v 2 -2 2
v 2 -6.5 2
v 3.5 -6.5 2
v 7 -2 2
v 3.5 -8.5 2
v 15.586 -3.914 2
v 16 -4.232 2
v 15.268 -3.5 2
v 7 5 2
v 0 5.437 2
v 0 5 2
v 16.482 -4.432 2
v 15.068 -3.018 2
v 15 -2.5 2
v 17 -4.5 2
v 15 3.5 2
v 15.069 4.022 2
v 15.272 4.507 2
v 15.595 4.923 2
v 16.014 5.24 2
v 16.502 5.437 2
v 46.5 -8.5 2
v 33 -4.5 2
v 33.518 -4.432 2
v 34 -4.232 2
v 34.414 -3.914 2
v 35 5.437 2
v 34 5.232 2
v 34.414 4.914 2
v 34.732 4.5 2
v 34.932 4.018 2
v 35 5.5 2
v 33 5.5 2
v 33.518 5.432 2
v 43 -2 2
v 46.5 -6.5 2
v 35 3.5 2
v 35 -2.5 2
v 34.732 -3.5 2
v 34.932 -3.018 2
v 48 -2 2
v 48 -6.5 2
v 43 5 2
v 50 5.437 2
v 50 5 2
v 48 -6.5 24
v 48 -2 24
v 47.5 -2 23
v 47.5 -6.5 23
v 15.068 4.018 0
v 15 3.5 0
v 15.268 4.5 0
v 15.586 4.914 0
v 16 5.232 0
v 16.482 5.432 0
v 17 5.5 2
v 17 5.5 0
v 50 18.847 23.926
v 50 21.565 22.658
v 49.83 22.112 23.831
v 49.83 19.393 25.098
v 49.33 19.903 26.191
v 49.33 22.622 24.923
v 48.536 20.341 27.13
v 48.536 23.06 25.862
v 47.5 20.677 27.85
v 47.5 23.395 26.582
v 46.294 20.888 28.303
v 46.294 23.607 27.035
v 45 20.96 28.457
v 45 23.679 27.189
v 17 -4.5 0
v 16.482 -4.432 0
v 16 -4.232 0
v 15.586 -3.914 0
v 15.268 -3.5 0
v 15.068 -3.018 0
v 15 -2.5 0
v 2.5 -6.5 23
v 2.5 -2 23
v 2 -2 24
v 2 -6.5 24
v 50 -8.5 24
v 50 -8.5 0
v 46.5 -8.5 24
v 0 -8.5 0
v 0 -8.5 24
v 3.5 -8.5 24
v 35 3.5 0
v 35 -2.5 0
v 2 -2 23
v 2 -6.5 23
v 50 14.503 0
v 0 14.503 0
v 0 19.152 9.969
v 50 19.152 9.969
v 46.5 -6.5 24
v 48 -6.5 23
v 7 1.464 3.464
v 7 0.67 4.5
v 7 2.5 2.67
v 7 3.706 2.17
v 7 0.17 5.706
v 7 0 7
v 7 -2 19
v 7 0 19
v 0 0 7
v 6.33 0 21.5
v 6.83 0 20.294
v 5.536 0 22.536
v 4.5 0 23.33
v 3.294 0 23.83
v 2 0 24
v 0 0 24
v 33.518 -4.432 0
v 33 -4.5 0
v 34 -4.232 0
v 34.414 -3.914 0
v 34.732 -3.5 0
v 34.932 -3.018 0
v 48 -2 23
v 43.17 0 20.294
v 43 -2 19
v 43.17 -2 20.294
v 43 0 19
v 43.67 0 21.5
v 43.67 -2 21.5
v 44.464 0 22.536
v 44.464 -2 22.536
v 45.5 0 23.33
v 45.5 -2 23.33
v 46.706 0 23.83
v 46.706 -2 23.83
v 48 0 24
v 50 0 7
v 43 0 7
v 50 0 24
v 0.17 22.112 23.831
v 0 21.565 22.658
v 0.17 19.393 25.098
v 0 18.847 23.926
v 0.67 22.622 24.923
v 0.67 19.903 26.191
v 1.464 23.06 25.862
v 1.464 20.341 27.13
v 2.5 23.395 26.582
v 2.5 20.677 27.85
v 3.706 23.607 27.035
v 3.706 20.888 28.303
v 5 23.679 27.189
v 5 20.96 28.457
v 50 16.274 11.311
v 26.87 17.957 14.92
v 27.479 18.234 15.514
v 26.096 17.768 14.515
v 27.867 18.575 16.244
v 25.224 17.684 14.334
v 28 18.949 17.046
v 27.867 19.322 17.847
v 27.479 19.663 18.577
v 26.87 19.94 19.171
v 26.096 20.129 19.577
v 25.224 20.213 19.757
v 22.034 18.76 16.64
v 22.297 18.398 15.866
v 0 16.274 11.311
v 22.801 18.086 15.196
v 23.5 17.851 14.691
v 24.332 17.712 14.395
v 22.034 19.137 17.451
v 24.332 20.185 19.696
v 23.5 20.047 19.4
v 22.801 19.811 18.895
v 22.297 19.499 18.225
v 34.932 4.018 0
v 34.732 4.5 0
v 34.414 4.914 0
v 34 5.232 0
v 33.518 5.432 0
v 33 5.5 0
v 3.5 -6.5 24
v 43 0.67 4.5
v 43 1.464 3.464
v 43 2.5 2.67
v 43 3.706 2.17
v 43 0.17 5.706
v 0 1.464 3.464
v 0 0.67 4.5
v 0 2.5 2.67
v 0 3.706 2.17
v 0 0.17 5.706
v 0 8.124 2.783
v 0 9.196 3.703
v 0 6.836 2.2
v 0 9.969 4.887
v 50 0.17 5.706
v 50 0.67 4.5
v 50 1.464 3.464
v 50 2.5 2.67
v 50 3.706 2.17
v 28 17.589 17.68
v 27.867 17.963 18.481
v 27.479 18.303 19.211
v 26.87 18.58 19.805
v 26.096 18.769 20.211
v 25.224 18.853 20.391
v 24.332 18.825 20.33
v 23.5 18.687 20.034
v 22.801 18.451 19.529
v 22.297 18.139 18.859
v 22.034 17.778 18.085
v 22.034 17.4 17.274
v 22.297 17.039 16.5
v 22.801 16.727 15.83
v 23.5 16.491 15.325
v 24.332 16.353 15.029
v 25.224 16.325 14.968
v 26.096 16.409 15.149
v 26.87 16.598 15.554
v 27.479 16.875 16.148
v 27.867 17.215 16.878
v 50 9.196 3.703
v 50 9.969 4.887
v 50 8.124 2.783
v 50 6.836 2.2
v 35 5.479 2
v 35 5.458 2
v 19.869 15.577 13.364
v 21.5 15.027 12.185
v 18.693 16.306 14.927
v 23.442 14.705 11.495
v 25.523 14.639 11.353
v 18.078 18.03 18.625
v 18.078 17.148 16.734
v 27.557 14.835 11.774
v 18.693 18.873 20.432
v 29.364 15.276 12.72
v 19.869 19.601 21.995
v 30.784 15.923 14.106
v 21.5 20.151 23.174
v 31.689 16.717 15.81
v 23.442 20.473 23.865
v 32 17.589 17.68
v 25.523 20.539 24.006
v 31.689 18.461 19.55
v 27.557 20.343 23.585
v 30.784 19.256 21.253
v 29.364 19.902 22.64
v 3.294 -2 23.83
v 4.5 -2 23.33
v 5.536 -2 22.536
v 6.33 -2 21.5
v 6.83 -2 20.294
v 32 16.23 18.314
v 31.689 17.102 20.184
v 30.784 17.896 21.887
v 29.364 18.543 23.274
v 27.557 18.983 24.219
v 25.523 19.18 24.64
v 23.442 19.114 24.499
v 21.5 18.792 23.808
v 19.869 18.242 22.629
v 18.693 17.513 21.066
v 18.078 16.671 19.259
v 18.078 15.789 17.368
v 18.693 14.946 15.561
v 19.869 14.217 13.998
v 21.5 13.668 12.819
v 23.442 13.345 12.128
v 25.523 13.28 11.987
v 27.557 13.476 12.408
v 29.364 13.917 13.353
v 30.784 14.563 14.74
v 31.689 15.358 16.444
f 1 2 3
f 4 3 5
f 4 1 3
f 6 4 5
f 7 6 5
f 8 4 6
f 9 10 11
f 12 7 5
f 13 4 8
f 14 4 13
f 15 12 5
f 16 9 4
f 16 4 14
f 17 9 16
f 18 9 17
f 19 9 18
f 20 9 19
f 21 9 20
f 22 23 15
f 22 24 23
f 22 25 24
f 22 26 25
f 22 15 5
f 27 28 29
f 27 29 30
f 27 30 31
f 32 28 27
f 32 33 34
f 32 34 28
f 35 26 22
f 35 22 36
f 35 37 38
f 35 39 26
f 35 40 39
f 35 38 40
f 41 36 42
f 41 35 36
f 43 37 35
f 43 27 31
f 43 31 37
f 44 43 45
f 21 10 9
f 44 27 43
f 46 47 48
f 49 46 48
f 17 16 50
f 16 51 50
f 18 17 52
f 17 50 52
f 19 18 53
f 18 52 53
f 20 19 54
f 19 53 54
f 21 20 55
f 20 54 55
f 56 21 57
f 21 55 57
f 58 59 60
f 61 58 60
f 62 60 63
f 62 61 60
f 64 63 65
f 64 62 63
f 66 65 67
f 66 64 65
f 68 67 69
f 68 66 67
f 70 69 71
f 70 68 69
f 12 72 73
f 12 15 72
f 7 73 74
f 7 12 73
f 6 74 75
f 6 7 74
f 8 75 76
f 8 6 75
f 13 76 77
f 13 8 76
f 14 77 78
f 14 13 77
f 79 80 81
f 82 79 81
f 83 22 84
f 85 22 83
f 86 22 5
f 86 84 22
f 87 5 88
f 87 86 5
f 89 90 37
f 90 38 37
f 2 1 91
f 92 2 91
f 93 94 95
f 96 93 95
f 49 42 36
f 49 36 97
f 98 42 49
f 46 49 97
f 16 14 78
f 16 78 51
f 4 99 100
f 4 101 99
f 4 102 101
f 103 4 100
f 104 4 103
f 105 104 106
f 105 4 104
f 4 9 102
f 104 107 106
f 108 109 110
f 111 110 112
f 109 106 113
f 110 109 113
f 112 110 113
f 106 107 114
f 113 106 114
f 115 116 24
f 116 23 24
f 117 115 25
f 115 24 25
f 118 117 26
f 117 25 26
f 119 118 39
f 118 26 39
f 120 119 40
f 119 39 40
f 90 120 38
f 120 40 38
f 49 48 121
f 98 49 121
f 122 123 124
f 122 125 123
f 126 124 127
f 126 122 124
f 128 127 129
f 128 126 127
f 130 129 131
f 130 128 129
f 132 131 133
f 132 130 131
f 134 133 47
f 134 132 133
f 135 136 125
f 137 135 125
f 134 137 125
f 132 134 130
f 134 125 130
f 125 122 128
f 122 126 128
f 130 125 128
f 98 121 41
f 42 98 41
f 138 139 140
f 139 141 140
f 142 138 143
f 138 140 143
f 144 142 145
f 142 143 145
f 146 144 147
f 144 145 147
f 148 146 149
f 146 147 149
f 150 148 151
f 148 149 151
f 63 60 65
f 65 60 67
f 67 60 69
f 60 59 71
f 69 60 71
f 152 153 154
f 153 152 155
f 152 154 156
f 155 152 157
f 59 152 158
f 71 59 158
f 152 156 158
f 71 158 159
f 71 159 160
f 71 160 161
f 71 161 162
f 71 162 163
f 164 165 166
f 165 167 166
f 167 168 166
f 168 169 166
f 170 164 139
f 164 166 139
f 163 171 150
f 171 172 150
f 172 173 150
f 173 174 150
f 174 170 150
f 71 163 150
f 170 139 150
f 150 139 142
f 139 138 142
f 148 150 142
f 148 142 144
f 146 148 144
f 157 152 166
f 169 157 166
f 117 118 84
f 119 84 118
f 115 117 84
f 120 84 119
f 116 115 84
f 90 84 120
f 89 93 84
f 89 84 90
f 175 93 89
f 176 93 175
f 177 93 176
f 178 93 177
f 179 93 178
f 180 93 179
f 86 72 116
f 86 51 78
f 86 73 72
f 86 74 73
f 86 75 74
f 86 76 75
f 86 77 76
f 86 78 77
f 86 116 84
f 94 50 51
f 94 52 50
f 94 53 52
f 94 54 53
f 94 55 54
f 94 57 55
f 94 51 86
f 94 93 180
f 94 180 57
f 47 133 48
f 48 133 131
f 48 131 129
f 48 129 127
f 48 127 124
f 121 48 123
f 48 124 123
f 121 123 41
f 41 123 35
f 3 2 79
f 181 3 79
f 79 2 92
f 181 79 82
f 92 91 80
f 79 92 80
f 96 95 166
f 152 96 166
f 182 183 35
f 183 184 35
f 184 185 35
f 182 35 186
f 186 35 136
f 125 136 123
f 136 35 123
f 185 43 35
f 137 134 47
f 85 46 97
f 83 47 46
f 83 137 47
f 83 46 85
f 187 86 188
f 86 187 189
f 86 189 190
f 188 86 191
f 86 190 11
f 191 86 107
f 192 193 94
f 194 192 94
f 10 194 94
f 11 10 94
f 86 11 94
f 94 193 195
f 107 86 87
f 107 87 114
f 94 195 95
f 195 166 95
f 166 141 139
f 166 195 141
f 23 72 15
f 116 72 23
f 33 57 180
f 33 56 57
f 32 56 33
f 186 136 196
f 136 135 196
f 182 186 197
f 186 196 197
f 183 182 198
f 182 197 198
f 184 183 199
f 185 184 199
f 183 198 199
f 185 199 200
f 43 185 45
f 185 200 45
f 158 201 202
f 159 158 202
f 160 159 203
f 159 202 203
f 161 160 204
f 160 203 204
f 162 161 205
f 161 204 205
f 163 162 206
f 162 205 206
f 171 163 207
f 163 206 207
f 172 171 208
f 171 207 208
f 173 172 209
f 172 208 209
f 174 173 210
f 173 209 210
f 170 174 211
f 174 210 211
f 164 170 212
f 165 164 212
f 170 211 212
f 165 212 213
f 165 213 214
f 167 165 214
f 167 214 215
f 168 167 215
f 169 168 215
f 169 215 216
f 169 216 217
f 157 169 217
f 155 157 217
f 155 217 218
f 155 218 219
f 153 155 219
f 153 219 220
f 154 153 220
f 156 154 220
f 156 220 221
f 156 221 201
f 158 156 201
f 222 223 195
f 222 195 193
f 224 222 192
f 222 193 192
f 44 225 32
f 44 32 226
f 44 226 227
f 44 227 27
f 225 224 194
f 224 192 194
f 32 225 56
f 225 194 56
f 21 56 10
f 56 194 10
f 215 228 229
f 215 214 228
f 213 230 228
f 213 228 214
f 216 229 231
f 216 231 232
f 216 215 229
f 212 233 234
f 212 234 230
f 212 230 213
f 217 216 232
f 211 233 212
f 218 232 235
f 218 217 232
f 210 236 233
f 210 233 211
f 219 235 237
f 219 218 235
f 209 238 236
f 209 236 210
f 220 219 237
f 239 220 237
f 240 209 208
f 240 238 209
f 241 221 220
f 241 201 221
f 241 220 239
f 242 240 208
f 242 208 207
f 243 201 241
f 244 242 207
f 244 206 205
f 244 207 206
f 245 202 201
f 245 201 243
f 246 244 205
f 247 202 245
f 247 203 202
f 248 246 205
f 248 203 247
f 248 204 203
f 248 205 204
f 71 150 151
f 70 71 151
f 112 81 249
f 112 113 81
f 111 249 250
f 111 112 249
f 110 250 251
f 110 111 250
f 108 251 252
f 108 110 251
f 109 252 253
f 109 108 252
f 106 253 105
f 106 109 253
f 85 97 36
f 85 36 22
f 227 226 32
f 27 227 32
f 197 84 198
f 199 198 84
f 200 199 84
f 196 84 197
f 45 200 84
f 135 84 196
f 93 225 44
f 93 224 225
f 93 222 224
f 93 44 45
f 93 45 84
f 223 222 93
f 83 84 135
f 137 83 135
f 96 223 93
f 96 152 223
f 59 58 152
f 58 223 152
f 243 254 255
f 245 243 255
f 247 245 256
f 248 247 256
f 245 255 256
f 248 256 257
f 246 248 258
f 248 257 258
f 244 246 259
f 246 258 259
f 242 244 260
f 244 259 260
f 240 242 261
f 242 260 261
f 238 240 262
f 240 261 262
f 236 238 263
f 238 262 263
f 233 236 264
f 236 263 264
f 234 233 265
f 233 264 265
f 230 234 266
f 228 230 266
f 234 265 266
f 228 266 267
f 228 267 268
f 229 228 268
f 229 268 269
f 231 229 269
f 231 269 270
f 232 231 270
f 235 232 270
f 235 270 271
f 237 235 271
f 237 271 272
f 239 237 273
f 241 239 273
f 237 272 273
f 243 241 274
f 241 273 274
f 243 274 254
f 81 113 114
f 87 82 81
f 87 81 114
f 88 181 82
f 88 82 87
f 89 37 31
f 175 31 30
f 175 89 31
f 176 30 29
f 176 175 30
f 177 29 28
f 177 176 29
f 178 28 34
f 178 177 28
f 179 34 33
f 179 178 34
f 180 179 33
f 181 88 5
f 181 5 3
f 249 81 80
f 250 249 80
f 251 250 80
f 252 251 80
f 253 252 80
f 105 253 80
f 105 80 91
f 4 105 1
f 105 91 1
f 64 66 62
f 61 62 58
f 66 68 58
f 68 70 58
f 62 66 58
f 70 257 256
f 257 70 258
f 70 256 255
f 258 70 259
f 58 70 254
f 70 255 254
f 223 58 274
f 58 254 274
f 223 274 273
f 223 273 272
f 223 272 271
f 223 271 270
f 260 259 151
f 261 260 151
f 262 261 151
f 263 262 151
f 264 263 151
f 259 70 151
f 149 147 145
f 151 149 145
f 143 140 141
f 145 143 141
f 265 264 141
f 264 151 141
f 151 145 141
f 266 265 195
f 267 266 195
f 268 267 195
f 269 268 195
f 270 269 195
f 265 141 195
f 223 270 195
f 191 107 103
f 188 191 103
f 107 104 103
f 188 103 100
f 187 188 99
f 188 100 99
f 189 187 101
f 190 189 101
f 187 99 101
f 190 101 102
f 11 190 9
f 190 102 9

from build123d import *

# Parameters (mm, degrees)
F1_DEPTH      = 50
F3_DEPTH      = 3
F5_DEPTH      = 6.5
F6_W          = 2
F6_H          = 22
F5_FACE1_W    = 6.5
F5_FACE1_H    = 22
F7_DEPTH      = 1.5
F8_W          = 2
F8_H          = 22
F9_DEPTH      = 1.5
F10_W         = 36
F10_H         = 22
F11_DEPTH     = 2
F12_W         = 20
F12_H         = 10
F13_DEPTH     = 28.4580883963
F14_T4_DEPTH  = 50
F14_T10_DEPTH = 50
F14_T16_DEPTH = 50
F14_T23_DEPTH = 50
F14_T29_DEPTH = 50
F15_R         = 5
F16_T4_DEPTH  = 7.0003952761
F17_R         = 2
F18_R         = 2
F19_R         = 7
F19_R_2       = 3
F20_DEPTH     = 1.5
F22_DEPTH     = 4.5
F24_DEPTH     = 4.5
F25_R         = 5
F26_R         = 5


# Not quite as in the source:
# - a fillet or chamfer that OpenCascade refuses, or shapes differently, is made with other operations: its cross-section is extruded or revolved along the edge and cut away or added


with BuildPart() as f1:
    # F0 (on Right) → F1 (new body)
    with BuildSketch(Plane.YZ):
        Polygon((-2, 0), (0, 0), (0, 2), (0, 24), (-2, 24), align=None)
        Polygon((0, 2), (0, 0), (11, 0), (16.274498548, 11.3111986384), (23.6785478522, 27.1892336111), (20.9596244911, 28.4570883963), (8.6224815594, 2), align=None)
        Polygon((16.274498548, 11.3111986384), (11, 0), (14.5032248927, 0), (19.1520257719, 9.9693856574), align=None)
    extrude(amount=F1_DEPTH)

    # F2 (on face) → F3 (cut, through all)
    with BuildSketch(Plane(origin=(0, 6.3164084922, -2.9453896519), x_dir=(1, 0, 0), z_dir=(0, -0.906307787, 0.4226182617))):
        with BuildLine():
            ThreePointArc((22, 23.4566337426), (25, 20.4566337426), (28, 23.4566337426))
            Line((28, 23.4566337426), (22, 23.4566337426))
        make_face()
        with BuildLine():
            Line((22, 23.4566337426), (28, 23.4566337426))
            ThreePointArc((28, 23.4566337426), (25, 26.4566337426), (22, 23.4566337426))
        make_face()
    extrude(amount=-F3_DEPTH, mode=Mode.SUBTRACT)

    # F4 (on face) → F5 (join)
    with BuildSketch(Plane.XZ.offset(2)):
        Polygon((2, 2), (2, 24), (0, 24), (0, 0), (50, 0), (50, 24), (48, 24), (48, 2), align=None)
    extrude(amount=F5_DEPTH)

    # F6 (on face) + F5_face1 (on face) → F7 (join)
    with BuildSketch(Plane.YZ.offset(2)):
        with Locations((-7.5, 13)):
            Rectangle(F6_W, F6_H)
    with BuildSketch(Plane(origin=(48, -5.25, 13), x_dir=(0, -1, 0), z_dir=(-1, 0, 0))):
        Rectangle(F5_FACE1_W, F5_FACE1_H)
    extrude(amount=F7_DEPTH, dir=(1, 0, 0))

    # F8 (on face) → F9 (join)
    with BuildSketch(Plane(origin=(48, 0, 0), x_dir=(0, -1, 0), z_dir=(-1, 0, 0))):
        with Locations((7.5, 13)):
            Rectangle(F8_W, F8_H)
    extrude(amount=F9_DEPTH)

    # F10 (on face) → F11 (cut)
    with BuildSketch(Plane.XZ.offset(2)):
        with Locations((25, 13)):
            Rectangle(F10_W, F10_H)
    extrude(amount=-F11_DEPTH, mode=Mode.SUBTRACT)

    # F12 (on Top) → F13 (cut, through all)
    with BuildSketch(Plane.XY):
        with Locations((25, 0.5)):
            Rectangle(F12_W, F12_H)
    extrude(amount=F13_DEPTH, mode=Mode.SUBTRACT)

    # F14: fillet of radius 5 on 1 edges, made by hand


with BuildPart() as f14_tool2:
    # F14_s3 → F14_t4 (new body)
    with BuildSketch(Plane.YZ):
        with BuildLine():
            ThreePointArc((9.9686691906, 4.8869086913), (8.1236282971, 2.7830427709), (5.4371302554, 2))
            Line((5.4371302554, 2), (8.6224815594, 2))
            Line((8.6224815594, 2), (9.9686691906, 4.8869086913))
        make_face()
    extrude(amount=F14_T4_DEPTH)

    split(bisect_by=Plane.XZ.offset(-5.5), keep=Keep.BOTTOM)

    split(bisect_by=Plane.YZ.offset(15), keep=Keep.BOTTOM)


with BuildPart() as f1_1:
    add(f1.part)

    # F14_t1: union F14_tool2
    add(f14_tool2.part)


with BuildPart() as f14_tool8:
    # F14_s9 → F14_t10 (new body)
    with BuildSketch(Plane.YZ):
        with BuildLine():
            ThreePointArc((9.9686691906, 4.8869086913), (8.1236282971, 2.7830427709), (5.4371302554, 2))
            Line((5.4371302554, 2), (8.6224815594, 2))
            Line((8.6224815594, 2), (9.9686691906, 4.8869086913))
        make_face()
    extrude(amount=F14_T10_DEPTH)

    split(bisect_by=Plane.XZ.offset(-5.5), keep=Keep.TOP)

    split(bisect_by=Plane.YZ.offset(15), keep=Keep.BOTTOM)


with BuildPart() as f1_2:
    add(f1_1.part)

    # F14_t7: union F14_tool8
    add(f14_tool8.part)


with BuildPart() as f14_tool14:
    # F14_s15 → F14_t16 (new body)
    with BuildSketch(Plane.YZ):
        with BuildLine():
            ThreePointArc((9.9686691906, 4.8869086913), (8.1236282971, 2.7830427709), (5.4371302554, 2))
            Line((5.4371302554, 2), (8.6224815594, 2))
            Line((8.6224815594, 2), (9.9686691906, 4.8869086913))
        make_face()
    extrude(amount=F14_T16_DEPTH)

    split(bisect_by=Plane.XZ.offset(-5.5), keep=Keep.BOTTOM)

    split(bisect_by=Plane.YZ.offset(15), keep=Keep.TOP)

    split(bisect_by=Plane.YZ.offset(35), keep=Keep.BOTTOM)


with BuildPart() as f1_3:
    add(f1_2.part)

    # F14_t13: union F14_tool14
    add(f14_tool14.part)


with BuildPart() as f14_tool21:
    # F14_s22 → F14_t23 (new body)
    with BuildSketch(Plane.YZ):
        with BuildLine():
            ThreePointArc((9.9686691906, 4.8869086913), (8.1236282971, 2.7830427709), (5.4371302554, 2))
            Line((5.4371302554, 2), (8.6224815594, 2))
            Line((8.6224815594, 2), (9.9686691906, 4.8869086913))
        make_face()
    extrude(amount=F14_T23_DEPTH)

    split(bisect_by=Plane.XZ.offset(-5.5), keep=Keep.BOTTOM)

    split(bisect_by=Plane.YZ.offset(35), keep=Keep.TOP)


with BuildPart() as f1_4:
    add(f1_3.part)

    # F14_t20: union F14_tool21
    add(f14_tool21.part)


with BuildPart() as f14_tool27:
    # F14_s28 → F14_t29 (new body)
    with BuildSketch(Plane.YZ):
        with BuildLine():
            ThreePointArc((9.9686691906, 4.8869086913), (8.1236282971, 2.7830427709), (5.4371302554, 2))
            Line((5.4371302554, 2), (8.6224815594, 2))
            Line((8.6224815594, 2), (9.9686691906, 4.8869086913))
        make_face()
    extrude(amount=F14_T29_DEPTH)

    split(bisect_by=Plane.XZ.offset(-5.5), keep=Keep.TOP)

    split(bisect_by=Plane.YZ.offset(35), keep=Keep.TOP)


with BuildPart() as f1_5:
    add(f1_4.part)

    # F14_t26: union F14_tool27
    add(f14_tool27.part)

    # F15
    f15_edges = [f1_5.edges().sort_by_distance(p)[0] for p in [
        (3.5, 0, 2),
        (46.5, 0, 2),
    ]]
    fillet(f15_edges, radius=F15_R)

    # F16: fillet of radius 2 on 1 edges, made by hand


with BuildPart() as f16_tool2:
    # F16_s3 → F16_t4 (new body)
    with BuildSketch(Plane.XY):
        with BuildLine():
            ThreePointArc((35, 3.5), (34.4142135624, 4.9142135624), (33, 5.5))
            Line((33, 5.5), (33, 5.54))
            Line((33, 5.54), (35.04, 5.54))
            Line((35.04, 5.54), (35.04, 3.5))
            Line((35.04, 3.5), (35, 3.5))
        make_face()
    extrude(amount=F16_T4_DEPTH)

    split(bisect_by=Plane.XY.offset(2), keep=Keep.BOTTOM)


with BuildPart() as f1_6:
    add(f1_5.part)

    # F16_t1: union F16_tool2
    add(f16_tool2.part)

    # F17#2 (call 1 of 2: OpenCascade refuses the feature's edges together)
    f17_2_edges = [f1_6.edges().sort_by_distance(p)[0] for p in [
        (15, -4.5, 1),
    ]]
    fillet(f17_2_edges, radius=F17_R)

    # F17 (call 2 of 2)
    f17_edges = [f1_6.edges().sort_by_distance(p)[0] for p in [
        (15, 5.5, 1.000198),
    ]]
    fillet(f17_edges, radius=F17_R)

    # F18
    f18_edges = [f1_6.edges().sort_by_distance(p)[0] for p in [
        (35, -4.5, 1),
    ]]
    fillet(f18_edges, radius=F18_R)

    # F19 (on face) → F20 (cut)
    with BuildSketch(Plane(origin=(0, 6.3164084922, -2.9453896519), x_dir=(1, 0, 0), z_dir=(0, -0.906307787, 0.4226182617))):
        with Locations((25, 23.4566337426)):
            Circle(F19_R)
        with Locations((25, 23.4566337426)):
            Circle(F19_R_2, mode=Mode.SUBTRACT)
    extrude(amount=-F20_DEPTH, mode=Mode.SUBTRACT)

    # F21 (on face) → F22 (join, through all)
    with BuildSketch(Plane.XZ.offset(2)):
        Polygon((48, 23), (48, 24), (47.5, 23), align=None)
    extrude(amount=F22_DEPTH)

    # F23 (on face) → F24 (join, through all)
    with BuildSketch(Plane.XZ.offset(2)):
        Polygon((2.5, 23), (2, 24), (2, 23), align=None)
    extrude(amount=F24_DEPTH)

    # F25
    f25_edges = [f1_6.edges().sort_by_distance(p)[0] for p in [
        (50, 22.319086, 27.823161),
        (0, 22.319086, 27.823161),
    ]]
    fillet(f25_edges, radius=F25_R)

    # F26
    f26_edges = [f1_6.edges().sort_by_distance(p)[0] for p in [
        (7, -1, 24),
        (43, -1, 24),
    ]]
    fillet(f26_edges, radius=F26_R)


solid = f1_6.part
